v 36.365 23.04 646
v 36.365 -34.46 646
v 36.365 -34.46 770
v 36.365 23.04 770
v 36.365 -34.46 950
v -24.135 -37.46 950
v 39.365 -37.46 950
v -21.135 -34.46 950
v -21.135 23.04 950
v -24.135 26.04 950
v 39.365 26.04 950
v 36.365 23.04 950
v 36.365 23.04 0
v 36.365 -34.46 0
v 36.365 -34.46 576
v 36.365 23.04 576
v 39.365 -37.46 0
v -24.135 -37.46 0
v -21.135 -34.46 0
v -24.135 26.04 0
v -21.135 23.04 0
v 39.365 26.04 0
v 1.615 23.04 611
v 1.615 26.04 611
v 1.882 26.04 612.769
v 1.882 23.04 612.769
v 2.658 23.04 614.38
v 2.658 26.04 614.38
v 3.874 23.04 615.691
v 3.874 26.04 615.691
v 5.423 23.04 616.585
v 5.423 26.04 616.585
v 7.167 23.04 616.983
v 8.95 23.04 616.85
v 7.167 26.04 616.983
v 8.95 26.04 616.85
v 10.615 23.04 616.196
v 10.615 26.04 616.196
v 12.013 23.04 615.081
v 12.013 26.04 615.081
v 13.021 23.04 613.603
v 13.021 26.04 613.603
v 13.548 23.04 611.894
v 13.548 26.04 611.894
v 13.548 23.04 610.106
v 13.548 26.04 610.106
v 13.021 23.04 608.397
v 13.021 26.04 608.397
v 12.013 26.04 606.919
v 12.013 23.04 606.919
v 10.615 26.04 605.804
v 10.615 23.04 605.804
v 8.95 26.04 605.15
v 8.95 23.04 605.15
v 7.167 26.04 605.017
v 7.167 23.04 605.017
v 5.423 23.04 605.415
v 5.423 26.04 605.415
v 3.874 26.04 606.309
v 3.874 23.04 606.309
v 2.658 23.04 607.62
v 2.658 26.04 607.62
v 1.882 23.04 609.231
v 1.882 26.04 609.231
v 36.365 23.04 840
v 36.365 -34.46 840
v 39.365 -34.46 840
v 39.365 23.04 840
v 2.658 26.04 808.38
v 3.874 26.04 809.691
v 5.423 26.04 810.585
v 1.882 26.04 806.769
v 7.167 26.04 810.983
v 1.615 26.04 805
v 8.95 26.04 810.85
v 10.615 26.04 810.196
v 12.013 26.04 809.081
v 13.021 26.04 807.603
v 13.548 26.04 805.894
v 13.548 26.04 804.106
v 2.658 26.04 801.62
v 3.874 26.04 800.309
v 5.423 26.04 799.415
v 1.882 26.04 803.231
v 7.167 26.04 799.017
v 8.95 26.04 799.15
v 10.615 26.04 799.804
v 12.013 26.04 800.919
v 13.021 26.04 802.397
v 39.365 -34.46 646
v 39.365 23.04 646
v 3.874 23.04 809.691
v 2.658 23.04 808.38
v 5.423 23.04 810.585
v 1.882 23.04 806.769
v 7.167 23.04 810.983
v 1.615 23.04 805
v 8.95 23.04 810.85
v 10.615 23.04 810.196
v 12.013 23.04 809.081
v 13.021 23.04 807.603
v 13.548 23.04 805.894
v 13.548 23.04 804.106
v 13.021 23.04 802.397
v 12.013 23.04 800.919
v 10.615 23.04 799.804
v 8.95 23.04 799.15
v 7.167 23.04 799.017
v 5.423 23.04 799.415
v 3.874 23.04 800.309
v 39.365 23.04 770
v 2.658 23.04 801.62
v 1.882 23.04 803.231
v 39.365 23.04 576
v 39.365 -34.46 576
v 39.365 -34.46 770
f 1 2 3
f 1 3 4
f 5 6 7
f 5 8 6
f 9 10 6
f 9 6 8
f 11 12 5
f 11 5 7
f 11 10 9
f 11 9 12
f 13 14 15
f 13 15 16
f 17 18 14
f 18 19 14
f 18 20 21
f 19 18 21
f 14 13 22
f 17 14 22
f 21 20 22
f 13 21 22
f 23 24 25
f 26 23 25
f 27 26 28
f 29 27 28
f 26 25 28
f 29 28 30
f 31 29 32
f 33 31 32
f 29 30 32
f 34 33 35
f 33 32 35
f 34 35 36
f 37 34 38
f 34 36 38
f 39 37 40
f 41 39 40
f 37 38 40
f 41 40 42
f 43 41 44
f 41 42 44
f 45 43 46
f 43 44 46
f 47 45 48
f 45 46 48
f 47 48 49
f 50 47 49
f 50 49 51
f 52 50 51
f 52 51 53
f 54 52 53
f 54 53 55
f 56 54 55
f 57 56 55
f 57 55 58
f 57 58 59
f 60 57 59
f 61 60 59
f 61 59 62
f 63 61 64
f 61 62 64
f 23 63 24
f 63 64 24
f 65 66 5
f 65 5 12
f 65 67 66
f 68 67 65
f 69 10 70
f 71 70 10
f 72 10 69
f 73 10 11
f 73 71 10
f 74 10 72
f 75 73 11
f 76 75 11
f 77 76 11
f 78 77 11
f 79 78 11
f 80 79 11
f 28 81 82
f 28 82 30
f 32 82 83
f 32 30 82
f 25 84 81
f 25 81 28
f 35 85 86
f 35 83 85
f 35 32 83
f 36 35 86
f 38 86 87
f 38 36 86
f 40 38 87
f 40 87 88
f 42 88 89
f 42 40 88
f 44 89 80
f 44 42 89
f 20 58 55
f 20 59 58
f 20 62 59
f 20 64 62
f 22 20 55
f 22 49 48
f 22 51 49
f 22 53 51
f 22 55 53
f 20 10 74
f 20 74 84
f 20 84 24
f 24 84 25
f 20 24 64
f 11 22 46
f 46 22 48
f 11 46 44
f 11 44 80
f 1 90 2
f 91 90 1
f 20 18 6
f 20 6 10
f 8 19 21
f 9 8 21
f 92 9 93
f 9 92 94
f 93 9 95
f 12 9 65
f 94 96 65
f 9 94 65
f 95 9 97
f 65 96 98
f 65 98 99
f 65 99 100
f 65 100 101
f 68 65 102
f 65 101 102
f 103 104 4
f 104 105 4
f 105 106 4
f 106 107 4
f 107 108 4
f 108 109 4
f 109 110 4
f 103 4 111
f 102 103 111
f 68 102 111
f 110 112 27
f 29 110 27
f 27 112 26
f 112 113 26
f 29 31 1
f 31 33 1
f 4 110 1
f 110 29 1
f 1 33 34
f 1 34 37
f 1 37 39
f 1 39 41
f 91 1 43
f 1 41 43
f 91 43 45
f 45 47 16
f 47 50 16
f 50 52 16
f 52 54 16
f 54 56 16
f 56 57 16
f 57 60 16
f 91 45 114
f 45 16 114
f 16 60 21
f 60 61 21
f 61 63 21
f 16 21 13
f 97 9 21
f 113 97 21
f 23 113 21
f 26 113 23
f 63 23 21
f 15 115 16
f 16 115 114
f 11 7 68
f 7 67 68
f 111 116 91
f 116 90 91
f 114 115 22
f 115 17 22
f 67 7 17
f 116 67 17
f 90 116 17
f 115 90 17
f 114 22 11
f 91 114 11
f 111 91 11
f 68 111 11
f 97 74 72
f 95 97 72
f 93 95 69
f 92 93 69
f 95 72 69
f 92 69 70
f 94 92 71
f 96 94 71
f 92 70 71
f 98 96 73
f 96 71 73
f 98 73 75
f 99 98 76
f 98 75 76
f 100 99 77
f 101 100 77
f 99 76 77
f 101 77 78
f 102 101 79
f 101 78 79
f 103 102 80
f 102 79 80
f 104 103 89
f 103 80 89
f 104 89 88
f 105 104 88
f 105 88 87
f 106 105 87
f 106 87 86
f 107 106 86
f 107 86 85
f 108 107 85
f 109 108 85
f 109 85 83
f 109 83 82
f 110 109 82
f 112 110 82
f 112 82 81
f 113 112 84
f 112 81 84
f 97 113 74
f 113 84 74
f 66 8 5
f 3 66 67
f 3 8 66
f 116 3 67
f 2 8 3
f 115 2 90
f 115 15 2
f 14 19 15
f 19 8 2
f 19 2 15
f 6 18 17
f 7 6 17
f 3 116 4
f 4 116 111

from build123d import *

# Parameters (mm, degrees)
F0_W      = 63.5
F0_H      = 63.5
F0_W_2    = 57.5
F0_H_2    = 57.5
F1_DEPTH  = 950
F2_W      = 57.5
F2_H      = 70
F3_DEPTH  = 3
F4_W      = 57.5
F4_H      = 70
F5_DEPTH  = 3
F7_DEPTH  = 3
F8_DEPTH  = 3
F9_R      = 6
F10_DEPTH = 3
F11_R     = 6
F12_DEPTH = 3


with BuildPart() as f1:
    # F0 (on Top) → F1 (new body)
    with BuildSketch(Plane.XY):
        with Locations((7.6151648536, -5.7103513741)):
            Rectangle(F0_W, F0_H)
        with Locations((7.6151648536, -5.7103513741)):
            Rectangle(F0_W_2, F0_H_2, mode=Mode.SUBTRACT)
    extrude(amount=F1_DEPTH)

    # F2 (on face) → F3 (cut)
    with BuildSketch(Plane.YZ.offset(39.3651648536)):
        with Locations((-5.7103513741, 805)):
            Rectangle(F2_W, F2_H)
    extrude(amount=-F3_DEPTH, mode=Mode.SUBTRACT)

    # F4 (on face) → F5 (cut)
    with BuildSketch(Plane.YZ.offset(39.3651648536)):
        with Locations((-5.7103513741, 611)):
            Rectangle(F4_W, F4_H)
    extrude(amount=-F5_DEPTH, mode=Mode.SUBTRACT)

    # F9 (on face) → F10 (cut)
    with BuildSketch(Plane(origin=(0, 26.0396486259, 0), x_dir=(-1, 0, 0), z_dir=(0, 1, 0))):
        with Locations((-7.6151648536, 805)):
            Circle(F9_R)
    extrude(amount=-F10_DEPTH, mode=Mode.SUBTRACT)

    # F11 (on face) → F12 (cut)
    with BuildSketch(Plane(origin=(0, 26.0396486259, 0), x_dir=(-1, 0, 0), z_dir=(0, 1, 0))):
        with Locations((-7.6151648536, 611)):
            Circle(F11_R)
    extrude(amount=-F12_DEPTH, mode=Mode.SUBTRACT)


with BuildPart() as f7:
    # F4 (on face) → F7 (new body)
    with BuildSketch(Plane.YZ.offset(39.3651648536)):
        with Locations((-5.7103513741, 611)):
            Rectangle(F4_W, F4_H)
    extrude(amount=F7_DEPTH)

    # F8 (cut): a face of the model
    f8_faces = [f7.faces().sort_by_distance(p)[0] for p in [
        (42.3651648536, -5.7103513741, 611),
    ]]
    extrude(f8_faces, amount=-F8_DEPTH, mode=Mode.SUBTRACT)


solid = f1.part
